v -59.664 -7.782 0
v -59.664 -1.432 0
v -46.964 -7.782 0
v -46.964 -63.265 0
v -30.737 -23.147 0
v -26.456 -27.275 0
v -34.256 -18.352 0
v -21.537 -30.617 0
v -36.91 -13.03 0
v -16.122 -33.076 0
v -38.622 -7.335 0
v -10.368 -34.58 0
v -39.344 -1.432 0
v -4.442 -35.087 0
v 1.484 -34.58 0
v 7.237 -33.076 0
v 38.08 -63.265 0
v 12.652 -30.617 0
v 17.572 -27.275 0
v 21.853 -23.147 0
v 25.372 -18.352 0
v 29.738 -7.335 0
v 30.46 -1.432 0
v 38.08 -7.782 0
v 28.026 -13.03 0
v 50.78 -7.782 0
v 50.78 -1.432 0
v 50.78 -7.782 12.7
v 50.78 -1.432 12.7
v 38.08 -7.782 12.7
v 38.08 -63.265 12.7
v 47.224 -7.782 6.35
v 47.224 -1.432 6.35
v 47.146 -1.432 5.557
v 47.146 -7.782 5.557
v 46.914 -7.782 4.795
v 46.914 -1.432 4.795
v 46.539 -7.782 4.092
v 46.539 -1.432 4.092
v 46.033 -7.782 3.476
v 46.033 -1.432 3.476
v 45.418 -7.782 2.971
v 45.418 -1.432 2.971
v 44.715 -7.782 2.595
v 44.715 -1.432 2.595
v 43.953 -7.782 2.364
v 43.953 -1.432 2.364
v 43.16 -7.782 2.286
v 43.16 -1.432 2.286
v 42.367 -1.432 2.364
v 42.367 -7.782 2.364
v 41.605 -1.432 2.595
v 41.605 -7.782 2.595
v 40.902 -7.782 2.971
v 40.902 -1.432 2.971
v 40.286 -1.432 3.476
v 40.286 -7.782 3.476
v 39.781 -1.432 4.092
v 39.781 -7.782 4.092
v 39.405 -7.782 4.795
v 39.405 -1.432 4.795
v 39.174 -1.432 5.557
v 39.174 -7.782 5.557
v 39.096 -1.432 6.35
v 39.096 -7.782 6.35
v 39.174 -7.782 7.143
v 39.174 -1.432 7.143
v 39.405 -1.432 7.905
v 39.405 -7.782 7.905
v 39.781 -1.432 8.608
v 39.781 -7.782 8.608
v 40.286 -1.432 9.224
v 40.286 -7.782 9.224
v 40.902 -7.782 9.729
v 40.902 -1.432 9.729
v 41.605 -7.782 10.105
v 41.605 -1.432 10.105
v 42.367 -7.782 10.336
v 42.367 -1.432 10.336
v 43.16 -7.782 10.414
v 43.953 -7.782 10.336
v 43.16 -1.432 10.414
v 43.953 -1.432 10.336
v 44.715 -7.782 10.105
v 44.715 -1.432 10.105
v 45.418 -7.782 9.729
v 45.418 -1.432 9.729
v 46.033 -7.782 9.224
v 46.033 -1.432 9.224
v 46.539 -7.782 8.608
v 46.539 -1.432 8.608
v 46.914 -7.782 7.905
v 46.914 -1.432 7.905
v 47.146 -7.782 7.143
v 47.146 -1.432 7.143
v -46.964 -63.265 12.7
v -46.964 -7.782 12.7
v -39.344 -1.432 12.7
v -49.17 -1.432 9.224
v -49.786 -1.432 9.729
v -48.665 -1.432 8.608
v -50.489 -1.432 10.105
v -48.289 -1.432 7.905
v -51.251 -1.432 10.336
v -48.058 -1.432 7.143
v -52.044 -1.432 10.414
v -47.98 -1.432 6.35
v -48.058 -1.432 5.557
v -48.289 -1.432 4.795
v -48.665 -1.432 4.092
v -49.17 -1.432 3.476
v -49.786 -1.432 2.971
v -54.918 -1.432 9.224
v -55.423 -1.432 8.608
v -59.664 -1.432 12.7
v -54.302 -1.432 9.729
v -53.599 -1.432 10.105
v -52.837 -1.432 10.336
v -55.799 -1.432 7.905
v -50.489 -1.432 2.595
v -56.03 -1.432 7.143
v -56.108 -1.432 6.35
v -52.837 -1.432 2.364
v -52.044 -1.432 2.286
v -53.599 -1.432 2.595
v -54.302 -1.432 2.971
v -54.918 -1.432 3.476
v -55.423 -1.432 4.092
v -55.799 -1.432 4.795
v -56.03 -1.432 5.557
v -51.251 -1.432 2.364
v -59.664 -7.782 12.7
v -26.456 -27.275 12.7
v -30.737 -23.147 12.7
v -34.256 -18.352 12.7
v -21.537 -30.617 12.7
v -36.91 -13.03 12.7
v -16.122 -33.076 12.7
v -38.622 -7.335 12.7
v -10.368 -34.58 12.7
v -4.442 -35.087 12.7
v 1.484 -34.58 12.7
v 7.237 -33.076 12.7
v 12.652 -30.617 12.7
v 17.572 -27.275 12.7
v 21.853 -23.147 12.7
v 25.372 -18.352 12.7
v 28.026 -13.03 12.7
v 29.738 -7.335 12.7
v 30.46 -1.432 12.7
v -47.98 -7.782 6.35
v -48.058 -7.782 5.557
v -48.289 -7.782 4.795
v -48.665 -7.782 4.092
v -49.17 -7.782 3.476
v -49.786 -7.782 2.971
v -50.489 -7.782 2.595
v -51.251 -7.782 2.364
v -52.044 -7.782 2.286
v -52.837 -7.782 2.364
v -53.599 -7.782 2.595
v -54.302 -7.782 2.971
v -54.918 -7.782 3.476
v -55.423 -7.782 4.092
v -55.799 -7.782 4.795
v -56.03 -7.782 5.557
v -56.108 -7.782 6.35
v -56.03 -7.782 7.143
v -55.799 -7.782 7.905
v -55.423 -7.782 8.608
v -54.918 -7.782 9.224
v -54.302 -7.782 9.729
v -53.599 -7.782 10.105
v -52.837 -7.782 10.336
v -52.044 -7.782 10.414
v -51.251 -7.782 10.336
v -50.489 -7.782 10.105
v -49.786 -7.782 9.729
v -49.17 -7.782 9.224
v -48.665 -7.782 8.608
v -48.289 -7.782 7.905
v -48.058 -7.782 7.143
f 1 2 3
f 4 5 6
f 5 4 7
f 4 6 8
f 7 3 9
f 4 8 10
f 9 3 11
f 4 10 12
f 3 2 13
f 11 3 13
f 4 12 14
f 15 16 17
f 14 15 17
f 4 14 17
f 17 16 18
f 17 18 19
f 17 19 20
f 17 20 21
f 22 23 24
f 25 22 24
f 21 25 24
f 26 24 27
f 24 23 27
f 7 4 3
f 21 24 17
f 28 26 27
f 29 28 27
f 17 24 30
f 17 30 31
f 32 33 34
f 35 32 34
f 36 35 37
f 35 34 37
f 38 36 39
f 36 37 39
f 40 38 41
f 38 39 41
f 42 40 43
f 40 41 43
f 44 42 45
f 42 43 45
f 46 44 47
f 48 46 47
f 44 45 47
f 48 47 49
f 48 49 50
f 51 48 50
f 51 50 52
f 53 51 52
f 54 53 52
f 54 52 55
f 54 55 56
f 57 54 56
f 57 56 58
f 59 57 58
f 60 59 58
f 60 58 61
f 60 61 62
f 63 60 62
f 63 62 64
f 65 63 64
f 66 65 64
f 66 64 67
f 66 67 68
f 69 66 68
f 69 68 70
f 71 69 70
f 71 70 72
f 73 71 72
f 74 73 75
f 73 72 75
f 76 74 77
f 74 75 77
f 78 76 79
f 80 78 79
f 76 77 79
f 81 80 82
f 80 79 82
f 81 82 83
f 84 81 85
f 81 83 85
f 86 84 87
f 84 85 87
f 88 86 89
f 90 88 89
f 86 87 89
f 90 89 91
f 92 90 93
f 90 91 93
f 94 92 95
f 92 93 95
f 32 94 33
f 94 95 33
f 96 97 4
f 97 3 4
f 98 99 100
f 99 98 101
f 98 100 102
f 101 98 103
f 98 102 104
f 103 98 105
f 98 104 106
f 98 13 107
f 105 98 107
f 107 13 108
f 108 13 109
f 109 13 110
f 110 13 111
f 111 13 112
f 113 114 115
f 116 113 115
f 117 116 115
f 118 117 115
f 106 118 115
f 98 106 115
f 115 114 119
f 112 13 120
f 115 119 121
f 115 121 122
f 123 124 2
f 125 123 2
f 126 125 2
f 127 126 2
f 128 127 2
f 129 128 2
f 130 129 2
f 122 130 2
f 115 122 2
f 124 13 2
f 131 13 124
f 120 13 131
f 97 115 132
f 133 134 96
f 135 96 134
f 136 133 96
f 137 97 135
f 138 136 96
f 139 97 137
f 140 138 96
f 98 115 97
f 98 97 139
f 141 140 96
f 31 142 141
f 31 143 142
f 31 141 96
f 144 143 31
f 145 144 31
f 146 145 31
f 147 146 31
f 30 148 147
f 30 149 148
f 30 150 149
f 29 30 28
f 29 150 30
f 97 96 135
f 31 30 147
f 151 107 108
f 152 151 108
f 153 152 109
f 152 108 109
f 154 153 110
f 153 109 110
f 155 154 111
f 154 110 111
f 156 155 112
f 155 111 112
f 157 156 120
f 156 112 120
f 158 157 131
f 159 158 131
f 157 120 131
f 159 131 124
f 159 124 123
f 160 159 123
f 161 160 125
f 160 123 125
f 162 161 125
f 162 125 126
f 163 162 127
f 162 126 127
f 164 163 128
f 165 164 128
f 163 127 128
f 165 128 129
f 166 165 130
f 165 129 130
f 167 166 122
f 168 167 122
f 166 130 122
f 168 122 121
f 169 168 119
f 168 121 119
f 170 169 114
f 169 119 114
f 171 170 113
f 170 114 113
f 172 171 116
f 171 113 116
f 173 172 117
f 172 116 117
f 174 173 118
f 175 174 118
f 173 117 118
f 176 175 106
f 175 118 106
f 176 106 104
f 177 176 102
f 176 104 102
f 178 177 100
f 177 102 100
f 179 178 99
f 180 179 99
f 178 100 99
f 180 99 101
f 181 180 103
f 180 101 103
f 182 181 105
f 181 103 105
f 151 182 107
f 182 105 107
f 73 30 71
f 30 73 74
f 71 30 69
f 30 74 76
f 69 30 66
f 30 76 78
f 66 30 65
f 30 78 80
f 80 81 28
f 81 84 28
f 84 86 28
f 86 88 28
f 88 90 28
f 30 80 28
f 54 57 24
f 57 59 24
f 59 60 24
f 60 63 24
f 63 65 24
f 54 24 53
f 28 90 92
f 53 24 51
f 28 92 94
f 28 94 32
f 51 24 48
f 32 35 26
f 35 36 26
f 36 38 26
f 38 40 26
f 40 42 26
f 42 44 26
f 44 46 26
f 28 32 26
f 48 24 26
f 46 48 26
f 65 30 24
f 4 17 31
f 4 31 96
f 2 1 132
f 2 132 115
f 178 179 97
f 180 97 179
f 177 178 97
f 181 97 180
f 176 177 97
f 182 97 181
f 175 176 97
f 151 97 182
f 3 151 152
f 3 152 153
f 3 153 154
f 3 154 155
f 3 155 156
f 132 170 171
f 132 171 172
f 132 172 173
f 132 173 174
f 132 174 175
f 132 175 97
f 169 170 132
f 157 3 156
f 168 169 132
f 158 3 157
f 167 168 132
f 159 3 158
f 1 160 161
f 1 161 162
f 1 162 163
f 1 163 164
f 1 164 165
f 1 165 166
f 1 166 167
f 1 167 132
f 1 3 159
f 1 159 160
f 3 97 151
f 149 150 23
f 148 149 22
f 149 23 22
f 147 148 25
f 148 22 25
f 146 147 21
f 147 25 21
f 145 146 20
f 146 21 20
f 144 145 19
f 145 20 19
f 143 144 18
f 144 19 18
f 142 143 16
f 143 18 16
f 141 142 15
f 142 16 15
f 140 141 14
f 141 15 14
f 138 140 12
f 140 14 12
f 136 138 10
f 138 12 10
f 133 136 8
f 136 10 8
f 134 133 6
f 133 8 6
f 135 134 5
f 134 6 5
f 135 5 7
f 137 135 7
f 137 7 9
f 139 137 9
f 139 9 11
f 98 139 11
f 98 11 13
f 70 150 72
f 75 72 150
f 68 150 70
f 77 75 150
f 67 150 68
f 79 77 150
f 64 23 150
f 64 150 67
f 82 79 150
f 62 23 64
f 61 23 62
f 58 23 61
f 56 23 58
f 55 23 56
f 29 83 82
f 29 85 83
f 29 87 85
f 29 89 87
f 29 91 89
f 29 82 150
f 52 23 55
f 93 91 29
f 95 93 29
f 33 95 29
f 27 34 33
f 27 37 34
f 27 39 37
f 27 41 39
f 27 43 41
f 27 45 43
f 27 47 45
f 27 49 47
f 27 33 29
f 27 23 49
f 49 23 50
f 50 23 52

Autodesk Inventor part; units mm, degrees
ref_plane "YZ Plane" through (0, 0, 0) normal (1, 0, 0) x (0, 1, 0)
ref_plane "XZ Plane" through (0, 0, 0) normal (0, 1, 0) x (-1, 0, 0)
ref_plane "XY Plane" through (0, 0, 0) normal (0, 0, 1) x (1, 0, 0)
sketch "Sketch1" plane through (0, 0, 0) normal (0, 0, 1) x (1, 0, 0)
  line L0 (-39.344, -1.4316) -> (-39.3671, -1.4316)
  line L1 (-39.344, -1.4316) -> (-52.044, -1.4316)
  line L2 (-39.344, -1.4316) -> (-45.694, -1.4316)
  line L3 (-39.344, -1.4316) -> (-46.964, -1.4316)
  line L4 (-46.964, -1.4316) -> (-46.964, -22.4724)
  line L5 (-46.964, -7.7816) -> (-59.664, -7.7816)
  line L6 (-59.664, -7.7816) -> (-59.664, -1.4316)
  arc A0 (-39.344, -1.4316) -> (30.4598, -1.4316) centre (-4.4421, -0.1616) ccw
  line L7 (30.4598, -1.4316) -> (43.1598, -1.4316)
  arc A1 (-46.964, -22.4724) -> (38.0798, -22.4724) centre (-4.4421, -0.1616) ccw
  line L8 (30.4598, -1.4316) -> (38.0798, -1.4316)
  line L9 (38.0798, -1.4316) -> (38.0798, -22.4724)
  line L10 (38.0798, -7.7816) -> (50.7798, -7.7816)
  line L11 (50.7798, -7.7816) -> (50.7798, -1.4316)
  line L12 (43.1598, -1.4316) -> (50.7798, -1.4316)
  line L13 (-52.044, -1.4316) -> (-59.664, -1.4316)
  line L14 (-46.964, -42.5386) -> (-46.964, -22.4724)
  line L15 (-46.964, -63.265) -> (-46.964, -42.5386)
  line L16 (-46.964, -22.4724) -> (-31.3118, -22.4724)
  line L17 (24.2345, -20.0969) -> (38.1472, -20.0969)
  line L18 (38.0798, -22.4724) -> (38.0798, -63.265)
  line L19 (38.0798, -63.265) -> (-46.964, -63.265)
  point P0 (0, 0)
  point P1 (0, 0)
  dimension "d0" = 69.85
  dimension "d1" = 12.7
  dimension "d2" = 12.7
  dimension "d3" = 7.62
  dimension "d4" = 7.62
  dimension "d5" = 7.62
  dimension "d6" = 7.62
  dimension "d7" = 6.35
  dimension "d8" = 6.35
  dimension "d17" = 61.8334
extrude "Extrusion1" add sketch "Sketch1" along normal blind 12.7
sketch "Sketch2" plane through (-59.664, -1.4316, 0) normal (0, 1, 0) x (1, 0, 0)
  circle A0 centre (7.62, -6.35) radius 4.064
  circle A1 centre (102.8238, -6.35) radius 4.064
  line L0 (90.1238, 0) -> (90.1238, -12.7) projected
  line L1 (20.32, 0) -> (20.32, -12.7) projected
  point P0 (59.664, 0)
  dimension "d11" = 12.7
  dimension "d12" = 12.7
  dimension "d13" = 8.128
  dimension "d14" = 8.128
extrude "Extrusion2" cut sketch "Sketch2" against normal blind 25.4
properties part number "REAL MOTOR MOUNT 2.75 TOP"
